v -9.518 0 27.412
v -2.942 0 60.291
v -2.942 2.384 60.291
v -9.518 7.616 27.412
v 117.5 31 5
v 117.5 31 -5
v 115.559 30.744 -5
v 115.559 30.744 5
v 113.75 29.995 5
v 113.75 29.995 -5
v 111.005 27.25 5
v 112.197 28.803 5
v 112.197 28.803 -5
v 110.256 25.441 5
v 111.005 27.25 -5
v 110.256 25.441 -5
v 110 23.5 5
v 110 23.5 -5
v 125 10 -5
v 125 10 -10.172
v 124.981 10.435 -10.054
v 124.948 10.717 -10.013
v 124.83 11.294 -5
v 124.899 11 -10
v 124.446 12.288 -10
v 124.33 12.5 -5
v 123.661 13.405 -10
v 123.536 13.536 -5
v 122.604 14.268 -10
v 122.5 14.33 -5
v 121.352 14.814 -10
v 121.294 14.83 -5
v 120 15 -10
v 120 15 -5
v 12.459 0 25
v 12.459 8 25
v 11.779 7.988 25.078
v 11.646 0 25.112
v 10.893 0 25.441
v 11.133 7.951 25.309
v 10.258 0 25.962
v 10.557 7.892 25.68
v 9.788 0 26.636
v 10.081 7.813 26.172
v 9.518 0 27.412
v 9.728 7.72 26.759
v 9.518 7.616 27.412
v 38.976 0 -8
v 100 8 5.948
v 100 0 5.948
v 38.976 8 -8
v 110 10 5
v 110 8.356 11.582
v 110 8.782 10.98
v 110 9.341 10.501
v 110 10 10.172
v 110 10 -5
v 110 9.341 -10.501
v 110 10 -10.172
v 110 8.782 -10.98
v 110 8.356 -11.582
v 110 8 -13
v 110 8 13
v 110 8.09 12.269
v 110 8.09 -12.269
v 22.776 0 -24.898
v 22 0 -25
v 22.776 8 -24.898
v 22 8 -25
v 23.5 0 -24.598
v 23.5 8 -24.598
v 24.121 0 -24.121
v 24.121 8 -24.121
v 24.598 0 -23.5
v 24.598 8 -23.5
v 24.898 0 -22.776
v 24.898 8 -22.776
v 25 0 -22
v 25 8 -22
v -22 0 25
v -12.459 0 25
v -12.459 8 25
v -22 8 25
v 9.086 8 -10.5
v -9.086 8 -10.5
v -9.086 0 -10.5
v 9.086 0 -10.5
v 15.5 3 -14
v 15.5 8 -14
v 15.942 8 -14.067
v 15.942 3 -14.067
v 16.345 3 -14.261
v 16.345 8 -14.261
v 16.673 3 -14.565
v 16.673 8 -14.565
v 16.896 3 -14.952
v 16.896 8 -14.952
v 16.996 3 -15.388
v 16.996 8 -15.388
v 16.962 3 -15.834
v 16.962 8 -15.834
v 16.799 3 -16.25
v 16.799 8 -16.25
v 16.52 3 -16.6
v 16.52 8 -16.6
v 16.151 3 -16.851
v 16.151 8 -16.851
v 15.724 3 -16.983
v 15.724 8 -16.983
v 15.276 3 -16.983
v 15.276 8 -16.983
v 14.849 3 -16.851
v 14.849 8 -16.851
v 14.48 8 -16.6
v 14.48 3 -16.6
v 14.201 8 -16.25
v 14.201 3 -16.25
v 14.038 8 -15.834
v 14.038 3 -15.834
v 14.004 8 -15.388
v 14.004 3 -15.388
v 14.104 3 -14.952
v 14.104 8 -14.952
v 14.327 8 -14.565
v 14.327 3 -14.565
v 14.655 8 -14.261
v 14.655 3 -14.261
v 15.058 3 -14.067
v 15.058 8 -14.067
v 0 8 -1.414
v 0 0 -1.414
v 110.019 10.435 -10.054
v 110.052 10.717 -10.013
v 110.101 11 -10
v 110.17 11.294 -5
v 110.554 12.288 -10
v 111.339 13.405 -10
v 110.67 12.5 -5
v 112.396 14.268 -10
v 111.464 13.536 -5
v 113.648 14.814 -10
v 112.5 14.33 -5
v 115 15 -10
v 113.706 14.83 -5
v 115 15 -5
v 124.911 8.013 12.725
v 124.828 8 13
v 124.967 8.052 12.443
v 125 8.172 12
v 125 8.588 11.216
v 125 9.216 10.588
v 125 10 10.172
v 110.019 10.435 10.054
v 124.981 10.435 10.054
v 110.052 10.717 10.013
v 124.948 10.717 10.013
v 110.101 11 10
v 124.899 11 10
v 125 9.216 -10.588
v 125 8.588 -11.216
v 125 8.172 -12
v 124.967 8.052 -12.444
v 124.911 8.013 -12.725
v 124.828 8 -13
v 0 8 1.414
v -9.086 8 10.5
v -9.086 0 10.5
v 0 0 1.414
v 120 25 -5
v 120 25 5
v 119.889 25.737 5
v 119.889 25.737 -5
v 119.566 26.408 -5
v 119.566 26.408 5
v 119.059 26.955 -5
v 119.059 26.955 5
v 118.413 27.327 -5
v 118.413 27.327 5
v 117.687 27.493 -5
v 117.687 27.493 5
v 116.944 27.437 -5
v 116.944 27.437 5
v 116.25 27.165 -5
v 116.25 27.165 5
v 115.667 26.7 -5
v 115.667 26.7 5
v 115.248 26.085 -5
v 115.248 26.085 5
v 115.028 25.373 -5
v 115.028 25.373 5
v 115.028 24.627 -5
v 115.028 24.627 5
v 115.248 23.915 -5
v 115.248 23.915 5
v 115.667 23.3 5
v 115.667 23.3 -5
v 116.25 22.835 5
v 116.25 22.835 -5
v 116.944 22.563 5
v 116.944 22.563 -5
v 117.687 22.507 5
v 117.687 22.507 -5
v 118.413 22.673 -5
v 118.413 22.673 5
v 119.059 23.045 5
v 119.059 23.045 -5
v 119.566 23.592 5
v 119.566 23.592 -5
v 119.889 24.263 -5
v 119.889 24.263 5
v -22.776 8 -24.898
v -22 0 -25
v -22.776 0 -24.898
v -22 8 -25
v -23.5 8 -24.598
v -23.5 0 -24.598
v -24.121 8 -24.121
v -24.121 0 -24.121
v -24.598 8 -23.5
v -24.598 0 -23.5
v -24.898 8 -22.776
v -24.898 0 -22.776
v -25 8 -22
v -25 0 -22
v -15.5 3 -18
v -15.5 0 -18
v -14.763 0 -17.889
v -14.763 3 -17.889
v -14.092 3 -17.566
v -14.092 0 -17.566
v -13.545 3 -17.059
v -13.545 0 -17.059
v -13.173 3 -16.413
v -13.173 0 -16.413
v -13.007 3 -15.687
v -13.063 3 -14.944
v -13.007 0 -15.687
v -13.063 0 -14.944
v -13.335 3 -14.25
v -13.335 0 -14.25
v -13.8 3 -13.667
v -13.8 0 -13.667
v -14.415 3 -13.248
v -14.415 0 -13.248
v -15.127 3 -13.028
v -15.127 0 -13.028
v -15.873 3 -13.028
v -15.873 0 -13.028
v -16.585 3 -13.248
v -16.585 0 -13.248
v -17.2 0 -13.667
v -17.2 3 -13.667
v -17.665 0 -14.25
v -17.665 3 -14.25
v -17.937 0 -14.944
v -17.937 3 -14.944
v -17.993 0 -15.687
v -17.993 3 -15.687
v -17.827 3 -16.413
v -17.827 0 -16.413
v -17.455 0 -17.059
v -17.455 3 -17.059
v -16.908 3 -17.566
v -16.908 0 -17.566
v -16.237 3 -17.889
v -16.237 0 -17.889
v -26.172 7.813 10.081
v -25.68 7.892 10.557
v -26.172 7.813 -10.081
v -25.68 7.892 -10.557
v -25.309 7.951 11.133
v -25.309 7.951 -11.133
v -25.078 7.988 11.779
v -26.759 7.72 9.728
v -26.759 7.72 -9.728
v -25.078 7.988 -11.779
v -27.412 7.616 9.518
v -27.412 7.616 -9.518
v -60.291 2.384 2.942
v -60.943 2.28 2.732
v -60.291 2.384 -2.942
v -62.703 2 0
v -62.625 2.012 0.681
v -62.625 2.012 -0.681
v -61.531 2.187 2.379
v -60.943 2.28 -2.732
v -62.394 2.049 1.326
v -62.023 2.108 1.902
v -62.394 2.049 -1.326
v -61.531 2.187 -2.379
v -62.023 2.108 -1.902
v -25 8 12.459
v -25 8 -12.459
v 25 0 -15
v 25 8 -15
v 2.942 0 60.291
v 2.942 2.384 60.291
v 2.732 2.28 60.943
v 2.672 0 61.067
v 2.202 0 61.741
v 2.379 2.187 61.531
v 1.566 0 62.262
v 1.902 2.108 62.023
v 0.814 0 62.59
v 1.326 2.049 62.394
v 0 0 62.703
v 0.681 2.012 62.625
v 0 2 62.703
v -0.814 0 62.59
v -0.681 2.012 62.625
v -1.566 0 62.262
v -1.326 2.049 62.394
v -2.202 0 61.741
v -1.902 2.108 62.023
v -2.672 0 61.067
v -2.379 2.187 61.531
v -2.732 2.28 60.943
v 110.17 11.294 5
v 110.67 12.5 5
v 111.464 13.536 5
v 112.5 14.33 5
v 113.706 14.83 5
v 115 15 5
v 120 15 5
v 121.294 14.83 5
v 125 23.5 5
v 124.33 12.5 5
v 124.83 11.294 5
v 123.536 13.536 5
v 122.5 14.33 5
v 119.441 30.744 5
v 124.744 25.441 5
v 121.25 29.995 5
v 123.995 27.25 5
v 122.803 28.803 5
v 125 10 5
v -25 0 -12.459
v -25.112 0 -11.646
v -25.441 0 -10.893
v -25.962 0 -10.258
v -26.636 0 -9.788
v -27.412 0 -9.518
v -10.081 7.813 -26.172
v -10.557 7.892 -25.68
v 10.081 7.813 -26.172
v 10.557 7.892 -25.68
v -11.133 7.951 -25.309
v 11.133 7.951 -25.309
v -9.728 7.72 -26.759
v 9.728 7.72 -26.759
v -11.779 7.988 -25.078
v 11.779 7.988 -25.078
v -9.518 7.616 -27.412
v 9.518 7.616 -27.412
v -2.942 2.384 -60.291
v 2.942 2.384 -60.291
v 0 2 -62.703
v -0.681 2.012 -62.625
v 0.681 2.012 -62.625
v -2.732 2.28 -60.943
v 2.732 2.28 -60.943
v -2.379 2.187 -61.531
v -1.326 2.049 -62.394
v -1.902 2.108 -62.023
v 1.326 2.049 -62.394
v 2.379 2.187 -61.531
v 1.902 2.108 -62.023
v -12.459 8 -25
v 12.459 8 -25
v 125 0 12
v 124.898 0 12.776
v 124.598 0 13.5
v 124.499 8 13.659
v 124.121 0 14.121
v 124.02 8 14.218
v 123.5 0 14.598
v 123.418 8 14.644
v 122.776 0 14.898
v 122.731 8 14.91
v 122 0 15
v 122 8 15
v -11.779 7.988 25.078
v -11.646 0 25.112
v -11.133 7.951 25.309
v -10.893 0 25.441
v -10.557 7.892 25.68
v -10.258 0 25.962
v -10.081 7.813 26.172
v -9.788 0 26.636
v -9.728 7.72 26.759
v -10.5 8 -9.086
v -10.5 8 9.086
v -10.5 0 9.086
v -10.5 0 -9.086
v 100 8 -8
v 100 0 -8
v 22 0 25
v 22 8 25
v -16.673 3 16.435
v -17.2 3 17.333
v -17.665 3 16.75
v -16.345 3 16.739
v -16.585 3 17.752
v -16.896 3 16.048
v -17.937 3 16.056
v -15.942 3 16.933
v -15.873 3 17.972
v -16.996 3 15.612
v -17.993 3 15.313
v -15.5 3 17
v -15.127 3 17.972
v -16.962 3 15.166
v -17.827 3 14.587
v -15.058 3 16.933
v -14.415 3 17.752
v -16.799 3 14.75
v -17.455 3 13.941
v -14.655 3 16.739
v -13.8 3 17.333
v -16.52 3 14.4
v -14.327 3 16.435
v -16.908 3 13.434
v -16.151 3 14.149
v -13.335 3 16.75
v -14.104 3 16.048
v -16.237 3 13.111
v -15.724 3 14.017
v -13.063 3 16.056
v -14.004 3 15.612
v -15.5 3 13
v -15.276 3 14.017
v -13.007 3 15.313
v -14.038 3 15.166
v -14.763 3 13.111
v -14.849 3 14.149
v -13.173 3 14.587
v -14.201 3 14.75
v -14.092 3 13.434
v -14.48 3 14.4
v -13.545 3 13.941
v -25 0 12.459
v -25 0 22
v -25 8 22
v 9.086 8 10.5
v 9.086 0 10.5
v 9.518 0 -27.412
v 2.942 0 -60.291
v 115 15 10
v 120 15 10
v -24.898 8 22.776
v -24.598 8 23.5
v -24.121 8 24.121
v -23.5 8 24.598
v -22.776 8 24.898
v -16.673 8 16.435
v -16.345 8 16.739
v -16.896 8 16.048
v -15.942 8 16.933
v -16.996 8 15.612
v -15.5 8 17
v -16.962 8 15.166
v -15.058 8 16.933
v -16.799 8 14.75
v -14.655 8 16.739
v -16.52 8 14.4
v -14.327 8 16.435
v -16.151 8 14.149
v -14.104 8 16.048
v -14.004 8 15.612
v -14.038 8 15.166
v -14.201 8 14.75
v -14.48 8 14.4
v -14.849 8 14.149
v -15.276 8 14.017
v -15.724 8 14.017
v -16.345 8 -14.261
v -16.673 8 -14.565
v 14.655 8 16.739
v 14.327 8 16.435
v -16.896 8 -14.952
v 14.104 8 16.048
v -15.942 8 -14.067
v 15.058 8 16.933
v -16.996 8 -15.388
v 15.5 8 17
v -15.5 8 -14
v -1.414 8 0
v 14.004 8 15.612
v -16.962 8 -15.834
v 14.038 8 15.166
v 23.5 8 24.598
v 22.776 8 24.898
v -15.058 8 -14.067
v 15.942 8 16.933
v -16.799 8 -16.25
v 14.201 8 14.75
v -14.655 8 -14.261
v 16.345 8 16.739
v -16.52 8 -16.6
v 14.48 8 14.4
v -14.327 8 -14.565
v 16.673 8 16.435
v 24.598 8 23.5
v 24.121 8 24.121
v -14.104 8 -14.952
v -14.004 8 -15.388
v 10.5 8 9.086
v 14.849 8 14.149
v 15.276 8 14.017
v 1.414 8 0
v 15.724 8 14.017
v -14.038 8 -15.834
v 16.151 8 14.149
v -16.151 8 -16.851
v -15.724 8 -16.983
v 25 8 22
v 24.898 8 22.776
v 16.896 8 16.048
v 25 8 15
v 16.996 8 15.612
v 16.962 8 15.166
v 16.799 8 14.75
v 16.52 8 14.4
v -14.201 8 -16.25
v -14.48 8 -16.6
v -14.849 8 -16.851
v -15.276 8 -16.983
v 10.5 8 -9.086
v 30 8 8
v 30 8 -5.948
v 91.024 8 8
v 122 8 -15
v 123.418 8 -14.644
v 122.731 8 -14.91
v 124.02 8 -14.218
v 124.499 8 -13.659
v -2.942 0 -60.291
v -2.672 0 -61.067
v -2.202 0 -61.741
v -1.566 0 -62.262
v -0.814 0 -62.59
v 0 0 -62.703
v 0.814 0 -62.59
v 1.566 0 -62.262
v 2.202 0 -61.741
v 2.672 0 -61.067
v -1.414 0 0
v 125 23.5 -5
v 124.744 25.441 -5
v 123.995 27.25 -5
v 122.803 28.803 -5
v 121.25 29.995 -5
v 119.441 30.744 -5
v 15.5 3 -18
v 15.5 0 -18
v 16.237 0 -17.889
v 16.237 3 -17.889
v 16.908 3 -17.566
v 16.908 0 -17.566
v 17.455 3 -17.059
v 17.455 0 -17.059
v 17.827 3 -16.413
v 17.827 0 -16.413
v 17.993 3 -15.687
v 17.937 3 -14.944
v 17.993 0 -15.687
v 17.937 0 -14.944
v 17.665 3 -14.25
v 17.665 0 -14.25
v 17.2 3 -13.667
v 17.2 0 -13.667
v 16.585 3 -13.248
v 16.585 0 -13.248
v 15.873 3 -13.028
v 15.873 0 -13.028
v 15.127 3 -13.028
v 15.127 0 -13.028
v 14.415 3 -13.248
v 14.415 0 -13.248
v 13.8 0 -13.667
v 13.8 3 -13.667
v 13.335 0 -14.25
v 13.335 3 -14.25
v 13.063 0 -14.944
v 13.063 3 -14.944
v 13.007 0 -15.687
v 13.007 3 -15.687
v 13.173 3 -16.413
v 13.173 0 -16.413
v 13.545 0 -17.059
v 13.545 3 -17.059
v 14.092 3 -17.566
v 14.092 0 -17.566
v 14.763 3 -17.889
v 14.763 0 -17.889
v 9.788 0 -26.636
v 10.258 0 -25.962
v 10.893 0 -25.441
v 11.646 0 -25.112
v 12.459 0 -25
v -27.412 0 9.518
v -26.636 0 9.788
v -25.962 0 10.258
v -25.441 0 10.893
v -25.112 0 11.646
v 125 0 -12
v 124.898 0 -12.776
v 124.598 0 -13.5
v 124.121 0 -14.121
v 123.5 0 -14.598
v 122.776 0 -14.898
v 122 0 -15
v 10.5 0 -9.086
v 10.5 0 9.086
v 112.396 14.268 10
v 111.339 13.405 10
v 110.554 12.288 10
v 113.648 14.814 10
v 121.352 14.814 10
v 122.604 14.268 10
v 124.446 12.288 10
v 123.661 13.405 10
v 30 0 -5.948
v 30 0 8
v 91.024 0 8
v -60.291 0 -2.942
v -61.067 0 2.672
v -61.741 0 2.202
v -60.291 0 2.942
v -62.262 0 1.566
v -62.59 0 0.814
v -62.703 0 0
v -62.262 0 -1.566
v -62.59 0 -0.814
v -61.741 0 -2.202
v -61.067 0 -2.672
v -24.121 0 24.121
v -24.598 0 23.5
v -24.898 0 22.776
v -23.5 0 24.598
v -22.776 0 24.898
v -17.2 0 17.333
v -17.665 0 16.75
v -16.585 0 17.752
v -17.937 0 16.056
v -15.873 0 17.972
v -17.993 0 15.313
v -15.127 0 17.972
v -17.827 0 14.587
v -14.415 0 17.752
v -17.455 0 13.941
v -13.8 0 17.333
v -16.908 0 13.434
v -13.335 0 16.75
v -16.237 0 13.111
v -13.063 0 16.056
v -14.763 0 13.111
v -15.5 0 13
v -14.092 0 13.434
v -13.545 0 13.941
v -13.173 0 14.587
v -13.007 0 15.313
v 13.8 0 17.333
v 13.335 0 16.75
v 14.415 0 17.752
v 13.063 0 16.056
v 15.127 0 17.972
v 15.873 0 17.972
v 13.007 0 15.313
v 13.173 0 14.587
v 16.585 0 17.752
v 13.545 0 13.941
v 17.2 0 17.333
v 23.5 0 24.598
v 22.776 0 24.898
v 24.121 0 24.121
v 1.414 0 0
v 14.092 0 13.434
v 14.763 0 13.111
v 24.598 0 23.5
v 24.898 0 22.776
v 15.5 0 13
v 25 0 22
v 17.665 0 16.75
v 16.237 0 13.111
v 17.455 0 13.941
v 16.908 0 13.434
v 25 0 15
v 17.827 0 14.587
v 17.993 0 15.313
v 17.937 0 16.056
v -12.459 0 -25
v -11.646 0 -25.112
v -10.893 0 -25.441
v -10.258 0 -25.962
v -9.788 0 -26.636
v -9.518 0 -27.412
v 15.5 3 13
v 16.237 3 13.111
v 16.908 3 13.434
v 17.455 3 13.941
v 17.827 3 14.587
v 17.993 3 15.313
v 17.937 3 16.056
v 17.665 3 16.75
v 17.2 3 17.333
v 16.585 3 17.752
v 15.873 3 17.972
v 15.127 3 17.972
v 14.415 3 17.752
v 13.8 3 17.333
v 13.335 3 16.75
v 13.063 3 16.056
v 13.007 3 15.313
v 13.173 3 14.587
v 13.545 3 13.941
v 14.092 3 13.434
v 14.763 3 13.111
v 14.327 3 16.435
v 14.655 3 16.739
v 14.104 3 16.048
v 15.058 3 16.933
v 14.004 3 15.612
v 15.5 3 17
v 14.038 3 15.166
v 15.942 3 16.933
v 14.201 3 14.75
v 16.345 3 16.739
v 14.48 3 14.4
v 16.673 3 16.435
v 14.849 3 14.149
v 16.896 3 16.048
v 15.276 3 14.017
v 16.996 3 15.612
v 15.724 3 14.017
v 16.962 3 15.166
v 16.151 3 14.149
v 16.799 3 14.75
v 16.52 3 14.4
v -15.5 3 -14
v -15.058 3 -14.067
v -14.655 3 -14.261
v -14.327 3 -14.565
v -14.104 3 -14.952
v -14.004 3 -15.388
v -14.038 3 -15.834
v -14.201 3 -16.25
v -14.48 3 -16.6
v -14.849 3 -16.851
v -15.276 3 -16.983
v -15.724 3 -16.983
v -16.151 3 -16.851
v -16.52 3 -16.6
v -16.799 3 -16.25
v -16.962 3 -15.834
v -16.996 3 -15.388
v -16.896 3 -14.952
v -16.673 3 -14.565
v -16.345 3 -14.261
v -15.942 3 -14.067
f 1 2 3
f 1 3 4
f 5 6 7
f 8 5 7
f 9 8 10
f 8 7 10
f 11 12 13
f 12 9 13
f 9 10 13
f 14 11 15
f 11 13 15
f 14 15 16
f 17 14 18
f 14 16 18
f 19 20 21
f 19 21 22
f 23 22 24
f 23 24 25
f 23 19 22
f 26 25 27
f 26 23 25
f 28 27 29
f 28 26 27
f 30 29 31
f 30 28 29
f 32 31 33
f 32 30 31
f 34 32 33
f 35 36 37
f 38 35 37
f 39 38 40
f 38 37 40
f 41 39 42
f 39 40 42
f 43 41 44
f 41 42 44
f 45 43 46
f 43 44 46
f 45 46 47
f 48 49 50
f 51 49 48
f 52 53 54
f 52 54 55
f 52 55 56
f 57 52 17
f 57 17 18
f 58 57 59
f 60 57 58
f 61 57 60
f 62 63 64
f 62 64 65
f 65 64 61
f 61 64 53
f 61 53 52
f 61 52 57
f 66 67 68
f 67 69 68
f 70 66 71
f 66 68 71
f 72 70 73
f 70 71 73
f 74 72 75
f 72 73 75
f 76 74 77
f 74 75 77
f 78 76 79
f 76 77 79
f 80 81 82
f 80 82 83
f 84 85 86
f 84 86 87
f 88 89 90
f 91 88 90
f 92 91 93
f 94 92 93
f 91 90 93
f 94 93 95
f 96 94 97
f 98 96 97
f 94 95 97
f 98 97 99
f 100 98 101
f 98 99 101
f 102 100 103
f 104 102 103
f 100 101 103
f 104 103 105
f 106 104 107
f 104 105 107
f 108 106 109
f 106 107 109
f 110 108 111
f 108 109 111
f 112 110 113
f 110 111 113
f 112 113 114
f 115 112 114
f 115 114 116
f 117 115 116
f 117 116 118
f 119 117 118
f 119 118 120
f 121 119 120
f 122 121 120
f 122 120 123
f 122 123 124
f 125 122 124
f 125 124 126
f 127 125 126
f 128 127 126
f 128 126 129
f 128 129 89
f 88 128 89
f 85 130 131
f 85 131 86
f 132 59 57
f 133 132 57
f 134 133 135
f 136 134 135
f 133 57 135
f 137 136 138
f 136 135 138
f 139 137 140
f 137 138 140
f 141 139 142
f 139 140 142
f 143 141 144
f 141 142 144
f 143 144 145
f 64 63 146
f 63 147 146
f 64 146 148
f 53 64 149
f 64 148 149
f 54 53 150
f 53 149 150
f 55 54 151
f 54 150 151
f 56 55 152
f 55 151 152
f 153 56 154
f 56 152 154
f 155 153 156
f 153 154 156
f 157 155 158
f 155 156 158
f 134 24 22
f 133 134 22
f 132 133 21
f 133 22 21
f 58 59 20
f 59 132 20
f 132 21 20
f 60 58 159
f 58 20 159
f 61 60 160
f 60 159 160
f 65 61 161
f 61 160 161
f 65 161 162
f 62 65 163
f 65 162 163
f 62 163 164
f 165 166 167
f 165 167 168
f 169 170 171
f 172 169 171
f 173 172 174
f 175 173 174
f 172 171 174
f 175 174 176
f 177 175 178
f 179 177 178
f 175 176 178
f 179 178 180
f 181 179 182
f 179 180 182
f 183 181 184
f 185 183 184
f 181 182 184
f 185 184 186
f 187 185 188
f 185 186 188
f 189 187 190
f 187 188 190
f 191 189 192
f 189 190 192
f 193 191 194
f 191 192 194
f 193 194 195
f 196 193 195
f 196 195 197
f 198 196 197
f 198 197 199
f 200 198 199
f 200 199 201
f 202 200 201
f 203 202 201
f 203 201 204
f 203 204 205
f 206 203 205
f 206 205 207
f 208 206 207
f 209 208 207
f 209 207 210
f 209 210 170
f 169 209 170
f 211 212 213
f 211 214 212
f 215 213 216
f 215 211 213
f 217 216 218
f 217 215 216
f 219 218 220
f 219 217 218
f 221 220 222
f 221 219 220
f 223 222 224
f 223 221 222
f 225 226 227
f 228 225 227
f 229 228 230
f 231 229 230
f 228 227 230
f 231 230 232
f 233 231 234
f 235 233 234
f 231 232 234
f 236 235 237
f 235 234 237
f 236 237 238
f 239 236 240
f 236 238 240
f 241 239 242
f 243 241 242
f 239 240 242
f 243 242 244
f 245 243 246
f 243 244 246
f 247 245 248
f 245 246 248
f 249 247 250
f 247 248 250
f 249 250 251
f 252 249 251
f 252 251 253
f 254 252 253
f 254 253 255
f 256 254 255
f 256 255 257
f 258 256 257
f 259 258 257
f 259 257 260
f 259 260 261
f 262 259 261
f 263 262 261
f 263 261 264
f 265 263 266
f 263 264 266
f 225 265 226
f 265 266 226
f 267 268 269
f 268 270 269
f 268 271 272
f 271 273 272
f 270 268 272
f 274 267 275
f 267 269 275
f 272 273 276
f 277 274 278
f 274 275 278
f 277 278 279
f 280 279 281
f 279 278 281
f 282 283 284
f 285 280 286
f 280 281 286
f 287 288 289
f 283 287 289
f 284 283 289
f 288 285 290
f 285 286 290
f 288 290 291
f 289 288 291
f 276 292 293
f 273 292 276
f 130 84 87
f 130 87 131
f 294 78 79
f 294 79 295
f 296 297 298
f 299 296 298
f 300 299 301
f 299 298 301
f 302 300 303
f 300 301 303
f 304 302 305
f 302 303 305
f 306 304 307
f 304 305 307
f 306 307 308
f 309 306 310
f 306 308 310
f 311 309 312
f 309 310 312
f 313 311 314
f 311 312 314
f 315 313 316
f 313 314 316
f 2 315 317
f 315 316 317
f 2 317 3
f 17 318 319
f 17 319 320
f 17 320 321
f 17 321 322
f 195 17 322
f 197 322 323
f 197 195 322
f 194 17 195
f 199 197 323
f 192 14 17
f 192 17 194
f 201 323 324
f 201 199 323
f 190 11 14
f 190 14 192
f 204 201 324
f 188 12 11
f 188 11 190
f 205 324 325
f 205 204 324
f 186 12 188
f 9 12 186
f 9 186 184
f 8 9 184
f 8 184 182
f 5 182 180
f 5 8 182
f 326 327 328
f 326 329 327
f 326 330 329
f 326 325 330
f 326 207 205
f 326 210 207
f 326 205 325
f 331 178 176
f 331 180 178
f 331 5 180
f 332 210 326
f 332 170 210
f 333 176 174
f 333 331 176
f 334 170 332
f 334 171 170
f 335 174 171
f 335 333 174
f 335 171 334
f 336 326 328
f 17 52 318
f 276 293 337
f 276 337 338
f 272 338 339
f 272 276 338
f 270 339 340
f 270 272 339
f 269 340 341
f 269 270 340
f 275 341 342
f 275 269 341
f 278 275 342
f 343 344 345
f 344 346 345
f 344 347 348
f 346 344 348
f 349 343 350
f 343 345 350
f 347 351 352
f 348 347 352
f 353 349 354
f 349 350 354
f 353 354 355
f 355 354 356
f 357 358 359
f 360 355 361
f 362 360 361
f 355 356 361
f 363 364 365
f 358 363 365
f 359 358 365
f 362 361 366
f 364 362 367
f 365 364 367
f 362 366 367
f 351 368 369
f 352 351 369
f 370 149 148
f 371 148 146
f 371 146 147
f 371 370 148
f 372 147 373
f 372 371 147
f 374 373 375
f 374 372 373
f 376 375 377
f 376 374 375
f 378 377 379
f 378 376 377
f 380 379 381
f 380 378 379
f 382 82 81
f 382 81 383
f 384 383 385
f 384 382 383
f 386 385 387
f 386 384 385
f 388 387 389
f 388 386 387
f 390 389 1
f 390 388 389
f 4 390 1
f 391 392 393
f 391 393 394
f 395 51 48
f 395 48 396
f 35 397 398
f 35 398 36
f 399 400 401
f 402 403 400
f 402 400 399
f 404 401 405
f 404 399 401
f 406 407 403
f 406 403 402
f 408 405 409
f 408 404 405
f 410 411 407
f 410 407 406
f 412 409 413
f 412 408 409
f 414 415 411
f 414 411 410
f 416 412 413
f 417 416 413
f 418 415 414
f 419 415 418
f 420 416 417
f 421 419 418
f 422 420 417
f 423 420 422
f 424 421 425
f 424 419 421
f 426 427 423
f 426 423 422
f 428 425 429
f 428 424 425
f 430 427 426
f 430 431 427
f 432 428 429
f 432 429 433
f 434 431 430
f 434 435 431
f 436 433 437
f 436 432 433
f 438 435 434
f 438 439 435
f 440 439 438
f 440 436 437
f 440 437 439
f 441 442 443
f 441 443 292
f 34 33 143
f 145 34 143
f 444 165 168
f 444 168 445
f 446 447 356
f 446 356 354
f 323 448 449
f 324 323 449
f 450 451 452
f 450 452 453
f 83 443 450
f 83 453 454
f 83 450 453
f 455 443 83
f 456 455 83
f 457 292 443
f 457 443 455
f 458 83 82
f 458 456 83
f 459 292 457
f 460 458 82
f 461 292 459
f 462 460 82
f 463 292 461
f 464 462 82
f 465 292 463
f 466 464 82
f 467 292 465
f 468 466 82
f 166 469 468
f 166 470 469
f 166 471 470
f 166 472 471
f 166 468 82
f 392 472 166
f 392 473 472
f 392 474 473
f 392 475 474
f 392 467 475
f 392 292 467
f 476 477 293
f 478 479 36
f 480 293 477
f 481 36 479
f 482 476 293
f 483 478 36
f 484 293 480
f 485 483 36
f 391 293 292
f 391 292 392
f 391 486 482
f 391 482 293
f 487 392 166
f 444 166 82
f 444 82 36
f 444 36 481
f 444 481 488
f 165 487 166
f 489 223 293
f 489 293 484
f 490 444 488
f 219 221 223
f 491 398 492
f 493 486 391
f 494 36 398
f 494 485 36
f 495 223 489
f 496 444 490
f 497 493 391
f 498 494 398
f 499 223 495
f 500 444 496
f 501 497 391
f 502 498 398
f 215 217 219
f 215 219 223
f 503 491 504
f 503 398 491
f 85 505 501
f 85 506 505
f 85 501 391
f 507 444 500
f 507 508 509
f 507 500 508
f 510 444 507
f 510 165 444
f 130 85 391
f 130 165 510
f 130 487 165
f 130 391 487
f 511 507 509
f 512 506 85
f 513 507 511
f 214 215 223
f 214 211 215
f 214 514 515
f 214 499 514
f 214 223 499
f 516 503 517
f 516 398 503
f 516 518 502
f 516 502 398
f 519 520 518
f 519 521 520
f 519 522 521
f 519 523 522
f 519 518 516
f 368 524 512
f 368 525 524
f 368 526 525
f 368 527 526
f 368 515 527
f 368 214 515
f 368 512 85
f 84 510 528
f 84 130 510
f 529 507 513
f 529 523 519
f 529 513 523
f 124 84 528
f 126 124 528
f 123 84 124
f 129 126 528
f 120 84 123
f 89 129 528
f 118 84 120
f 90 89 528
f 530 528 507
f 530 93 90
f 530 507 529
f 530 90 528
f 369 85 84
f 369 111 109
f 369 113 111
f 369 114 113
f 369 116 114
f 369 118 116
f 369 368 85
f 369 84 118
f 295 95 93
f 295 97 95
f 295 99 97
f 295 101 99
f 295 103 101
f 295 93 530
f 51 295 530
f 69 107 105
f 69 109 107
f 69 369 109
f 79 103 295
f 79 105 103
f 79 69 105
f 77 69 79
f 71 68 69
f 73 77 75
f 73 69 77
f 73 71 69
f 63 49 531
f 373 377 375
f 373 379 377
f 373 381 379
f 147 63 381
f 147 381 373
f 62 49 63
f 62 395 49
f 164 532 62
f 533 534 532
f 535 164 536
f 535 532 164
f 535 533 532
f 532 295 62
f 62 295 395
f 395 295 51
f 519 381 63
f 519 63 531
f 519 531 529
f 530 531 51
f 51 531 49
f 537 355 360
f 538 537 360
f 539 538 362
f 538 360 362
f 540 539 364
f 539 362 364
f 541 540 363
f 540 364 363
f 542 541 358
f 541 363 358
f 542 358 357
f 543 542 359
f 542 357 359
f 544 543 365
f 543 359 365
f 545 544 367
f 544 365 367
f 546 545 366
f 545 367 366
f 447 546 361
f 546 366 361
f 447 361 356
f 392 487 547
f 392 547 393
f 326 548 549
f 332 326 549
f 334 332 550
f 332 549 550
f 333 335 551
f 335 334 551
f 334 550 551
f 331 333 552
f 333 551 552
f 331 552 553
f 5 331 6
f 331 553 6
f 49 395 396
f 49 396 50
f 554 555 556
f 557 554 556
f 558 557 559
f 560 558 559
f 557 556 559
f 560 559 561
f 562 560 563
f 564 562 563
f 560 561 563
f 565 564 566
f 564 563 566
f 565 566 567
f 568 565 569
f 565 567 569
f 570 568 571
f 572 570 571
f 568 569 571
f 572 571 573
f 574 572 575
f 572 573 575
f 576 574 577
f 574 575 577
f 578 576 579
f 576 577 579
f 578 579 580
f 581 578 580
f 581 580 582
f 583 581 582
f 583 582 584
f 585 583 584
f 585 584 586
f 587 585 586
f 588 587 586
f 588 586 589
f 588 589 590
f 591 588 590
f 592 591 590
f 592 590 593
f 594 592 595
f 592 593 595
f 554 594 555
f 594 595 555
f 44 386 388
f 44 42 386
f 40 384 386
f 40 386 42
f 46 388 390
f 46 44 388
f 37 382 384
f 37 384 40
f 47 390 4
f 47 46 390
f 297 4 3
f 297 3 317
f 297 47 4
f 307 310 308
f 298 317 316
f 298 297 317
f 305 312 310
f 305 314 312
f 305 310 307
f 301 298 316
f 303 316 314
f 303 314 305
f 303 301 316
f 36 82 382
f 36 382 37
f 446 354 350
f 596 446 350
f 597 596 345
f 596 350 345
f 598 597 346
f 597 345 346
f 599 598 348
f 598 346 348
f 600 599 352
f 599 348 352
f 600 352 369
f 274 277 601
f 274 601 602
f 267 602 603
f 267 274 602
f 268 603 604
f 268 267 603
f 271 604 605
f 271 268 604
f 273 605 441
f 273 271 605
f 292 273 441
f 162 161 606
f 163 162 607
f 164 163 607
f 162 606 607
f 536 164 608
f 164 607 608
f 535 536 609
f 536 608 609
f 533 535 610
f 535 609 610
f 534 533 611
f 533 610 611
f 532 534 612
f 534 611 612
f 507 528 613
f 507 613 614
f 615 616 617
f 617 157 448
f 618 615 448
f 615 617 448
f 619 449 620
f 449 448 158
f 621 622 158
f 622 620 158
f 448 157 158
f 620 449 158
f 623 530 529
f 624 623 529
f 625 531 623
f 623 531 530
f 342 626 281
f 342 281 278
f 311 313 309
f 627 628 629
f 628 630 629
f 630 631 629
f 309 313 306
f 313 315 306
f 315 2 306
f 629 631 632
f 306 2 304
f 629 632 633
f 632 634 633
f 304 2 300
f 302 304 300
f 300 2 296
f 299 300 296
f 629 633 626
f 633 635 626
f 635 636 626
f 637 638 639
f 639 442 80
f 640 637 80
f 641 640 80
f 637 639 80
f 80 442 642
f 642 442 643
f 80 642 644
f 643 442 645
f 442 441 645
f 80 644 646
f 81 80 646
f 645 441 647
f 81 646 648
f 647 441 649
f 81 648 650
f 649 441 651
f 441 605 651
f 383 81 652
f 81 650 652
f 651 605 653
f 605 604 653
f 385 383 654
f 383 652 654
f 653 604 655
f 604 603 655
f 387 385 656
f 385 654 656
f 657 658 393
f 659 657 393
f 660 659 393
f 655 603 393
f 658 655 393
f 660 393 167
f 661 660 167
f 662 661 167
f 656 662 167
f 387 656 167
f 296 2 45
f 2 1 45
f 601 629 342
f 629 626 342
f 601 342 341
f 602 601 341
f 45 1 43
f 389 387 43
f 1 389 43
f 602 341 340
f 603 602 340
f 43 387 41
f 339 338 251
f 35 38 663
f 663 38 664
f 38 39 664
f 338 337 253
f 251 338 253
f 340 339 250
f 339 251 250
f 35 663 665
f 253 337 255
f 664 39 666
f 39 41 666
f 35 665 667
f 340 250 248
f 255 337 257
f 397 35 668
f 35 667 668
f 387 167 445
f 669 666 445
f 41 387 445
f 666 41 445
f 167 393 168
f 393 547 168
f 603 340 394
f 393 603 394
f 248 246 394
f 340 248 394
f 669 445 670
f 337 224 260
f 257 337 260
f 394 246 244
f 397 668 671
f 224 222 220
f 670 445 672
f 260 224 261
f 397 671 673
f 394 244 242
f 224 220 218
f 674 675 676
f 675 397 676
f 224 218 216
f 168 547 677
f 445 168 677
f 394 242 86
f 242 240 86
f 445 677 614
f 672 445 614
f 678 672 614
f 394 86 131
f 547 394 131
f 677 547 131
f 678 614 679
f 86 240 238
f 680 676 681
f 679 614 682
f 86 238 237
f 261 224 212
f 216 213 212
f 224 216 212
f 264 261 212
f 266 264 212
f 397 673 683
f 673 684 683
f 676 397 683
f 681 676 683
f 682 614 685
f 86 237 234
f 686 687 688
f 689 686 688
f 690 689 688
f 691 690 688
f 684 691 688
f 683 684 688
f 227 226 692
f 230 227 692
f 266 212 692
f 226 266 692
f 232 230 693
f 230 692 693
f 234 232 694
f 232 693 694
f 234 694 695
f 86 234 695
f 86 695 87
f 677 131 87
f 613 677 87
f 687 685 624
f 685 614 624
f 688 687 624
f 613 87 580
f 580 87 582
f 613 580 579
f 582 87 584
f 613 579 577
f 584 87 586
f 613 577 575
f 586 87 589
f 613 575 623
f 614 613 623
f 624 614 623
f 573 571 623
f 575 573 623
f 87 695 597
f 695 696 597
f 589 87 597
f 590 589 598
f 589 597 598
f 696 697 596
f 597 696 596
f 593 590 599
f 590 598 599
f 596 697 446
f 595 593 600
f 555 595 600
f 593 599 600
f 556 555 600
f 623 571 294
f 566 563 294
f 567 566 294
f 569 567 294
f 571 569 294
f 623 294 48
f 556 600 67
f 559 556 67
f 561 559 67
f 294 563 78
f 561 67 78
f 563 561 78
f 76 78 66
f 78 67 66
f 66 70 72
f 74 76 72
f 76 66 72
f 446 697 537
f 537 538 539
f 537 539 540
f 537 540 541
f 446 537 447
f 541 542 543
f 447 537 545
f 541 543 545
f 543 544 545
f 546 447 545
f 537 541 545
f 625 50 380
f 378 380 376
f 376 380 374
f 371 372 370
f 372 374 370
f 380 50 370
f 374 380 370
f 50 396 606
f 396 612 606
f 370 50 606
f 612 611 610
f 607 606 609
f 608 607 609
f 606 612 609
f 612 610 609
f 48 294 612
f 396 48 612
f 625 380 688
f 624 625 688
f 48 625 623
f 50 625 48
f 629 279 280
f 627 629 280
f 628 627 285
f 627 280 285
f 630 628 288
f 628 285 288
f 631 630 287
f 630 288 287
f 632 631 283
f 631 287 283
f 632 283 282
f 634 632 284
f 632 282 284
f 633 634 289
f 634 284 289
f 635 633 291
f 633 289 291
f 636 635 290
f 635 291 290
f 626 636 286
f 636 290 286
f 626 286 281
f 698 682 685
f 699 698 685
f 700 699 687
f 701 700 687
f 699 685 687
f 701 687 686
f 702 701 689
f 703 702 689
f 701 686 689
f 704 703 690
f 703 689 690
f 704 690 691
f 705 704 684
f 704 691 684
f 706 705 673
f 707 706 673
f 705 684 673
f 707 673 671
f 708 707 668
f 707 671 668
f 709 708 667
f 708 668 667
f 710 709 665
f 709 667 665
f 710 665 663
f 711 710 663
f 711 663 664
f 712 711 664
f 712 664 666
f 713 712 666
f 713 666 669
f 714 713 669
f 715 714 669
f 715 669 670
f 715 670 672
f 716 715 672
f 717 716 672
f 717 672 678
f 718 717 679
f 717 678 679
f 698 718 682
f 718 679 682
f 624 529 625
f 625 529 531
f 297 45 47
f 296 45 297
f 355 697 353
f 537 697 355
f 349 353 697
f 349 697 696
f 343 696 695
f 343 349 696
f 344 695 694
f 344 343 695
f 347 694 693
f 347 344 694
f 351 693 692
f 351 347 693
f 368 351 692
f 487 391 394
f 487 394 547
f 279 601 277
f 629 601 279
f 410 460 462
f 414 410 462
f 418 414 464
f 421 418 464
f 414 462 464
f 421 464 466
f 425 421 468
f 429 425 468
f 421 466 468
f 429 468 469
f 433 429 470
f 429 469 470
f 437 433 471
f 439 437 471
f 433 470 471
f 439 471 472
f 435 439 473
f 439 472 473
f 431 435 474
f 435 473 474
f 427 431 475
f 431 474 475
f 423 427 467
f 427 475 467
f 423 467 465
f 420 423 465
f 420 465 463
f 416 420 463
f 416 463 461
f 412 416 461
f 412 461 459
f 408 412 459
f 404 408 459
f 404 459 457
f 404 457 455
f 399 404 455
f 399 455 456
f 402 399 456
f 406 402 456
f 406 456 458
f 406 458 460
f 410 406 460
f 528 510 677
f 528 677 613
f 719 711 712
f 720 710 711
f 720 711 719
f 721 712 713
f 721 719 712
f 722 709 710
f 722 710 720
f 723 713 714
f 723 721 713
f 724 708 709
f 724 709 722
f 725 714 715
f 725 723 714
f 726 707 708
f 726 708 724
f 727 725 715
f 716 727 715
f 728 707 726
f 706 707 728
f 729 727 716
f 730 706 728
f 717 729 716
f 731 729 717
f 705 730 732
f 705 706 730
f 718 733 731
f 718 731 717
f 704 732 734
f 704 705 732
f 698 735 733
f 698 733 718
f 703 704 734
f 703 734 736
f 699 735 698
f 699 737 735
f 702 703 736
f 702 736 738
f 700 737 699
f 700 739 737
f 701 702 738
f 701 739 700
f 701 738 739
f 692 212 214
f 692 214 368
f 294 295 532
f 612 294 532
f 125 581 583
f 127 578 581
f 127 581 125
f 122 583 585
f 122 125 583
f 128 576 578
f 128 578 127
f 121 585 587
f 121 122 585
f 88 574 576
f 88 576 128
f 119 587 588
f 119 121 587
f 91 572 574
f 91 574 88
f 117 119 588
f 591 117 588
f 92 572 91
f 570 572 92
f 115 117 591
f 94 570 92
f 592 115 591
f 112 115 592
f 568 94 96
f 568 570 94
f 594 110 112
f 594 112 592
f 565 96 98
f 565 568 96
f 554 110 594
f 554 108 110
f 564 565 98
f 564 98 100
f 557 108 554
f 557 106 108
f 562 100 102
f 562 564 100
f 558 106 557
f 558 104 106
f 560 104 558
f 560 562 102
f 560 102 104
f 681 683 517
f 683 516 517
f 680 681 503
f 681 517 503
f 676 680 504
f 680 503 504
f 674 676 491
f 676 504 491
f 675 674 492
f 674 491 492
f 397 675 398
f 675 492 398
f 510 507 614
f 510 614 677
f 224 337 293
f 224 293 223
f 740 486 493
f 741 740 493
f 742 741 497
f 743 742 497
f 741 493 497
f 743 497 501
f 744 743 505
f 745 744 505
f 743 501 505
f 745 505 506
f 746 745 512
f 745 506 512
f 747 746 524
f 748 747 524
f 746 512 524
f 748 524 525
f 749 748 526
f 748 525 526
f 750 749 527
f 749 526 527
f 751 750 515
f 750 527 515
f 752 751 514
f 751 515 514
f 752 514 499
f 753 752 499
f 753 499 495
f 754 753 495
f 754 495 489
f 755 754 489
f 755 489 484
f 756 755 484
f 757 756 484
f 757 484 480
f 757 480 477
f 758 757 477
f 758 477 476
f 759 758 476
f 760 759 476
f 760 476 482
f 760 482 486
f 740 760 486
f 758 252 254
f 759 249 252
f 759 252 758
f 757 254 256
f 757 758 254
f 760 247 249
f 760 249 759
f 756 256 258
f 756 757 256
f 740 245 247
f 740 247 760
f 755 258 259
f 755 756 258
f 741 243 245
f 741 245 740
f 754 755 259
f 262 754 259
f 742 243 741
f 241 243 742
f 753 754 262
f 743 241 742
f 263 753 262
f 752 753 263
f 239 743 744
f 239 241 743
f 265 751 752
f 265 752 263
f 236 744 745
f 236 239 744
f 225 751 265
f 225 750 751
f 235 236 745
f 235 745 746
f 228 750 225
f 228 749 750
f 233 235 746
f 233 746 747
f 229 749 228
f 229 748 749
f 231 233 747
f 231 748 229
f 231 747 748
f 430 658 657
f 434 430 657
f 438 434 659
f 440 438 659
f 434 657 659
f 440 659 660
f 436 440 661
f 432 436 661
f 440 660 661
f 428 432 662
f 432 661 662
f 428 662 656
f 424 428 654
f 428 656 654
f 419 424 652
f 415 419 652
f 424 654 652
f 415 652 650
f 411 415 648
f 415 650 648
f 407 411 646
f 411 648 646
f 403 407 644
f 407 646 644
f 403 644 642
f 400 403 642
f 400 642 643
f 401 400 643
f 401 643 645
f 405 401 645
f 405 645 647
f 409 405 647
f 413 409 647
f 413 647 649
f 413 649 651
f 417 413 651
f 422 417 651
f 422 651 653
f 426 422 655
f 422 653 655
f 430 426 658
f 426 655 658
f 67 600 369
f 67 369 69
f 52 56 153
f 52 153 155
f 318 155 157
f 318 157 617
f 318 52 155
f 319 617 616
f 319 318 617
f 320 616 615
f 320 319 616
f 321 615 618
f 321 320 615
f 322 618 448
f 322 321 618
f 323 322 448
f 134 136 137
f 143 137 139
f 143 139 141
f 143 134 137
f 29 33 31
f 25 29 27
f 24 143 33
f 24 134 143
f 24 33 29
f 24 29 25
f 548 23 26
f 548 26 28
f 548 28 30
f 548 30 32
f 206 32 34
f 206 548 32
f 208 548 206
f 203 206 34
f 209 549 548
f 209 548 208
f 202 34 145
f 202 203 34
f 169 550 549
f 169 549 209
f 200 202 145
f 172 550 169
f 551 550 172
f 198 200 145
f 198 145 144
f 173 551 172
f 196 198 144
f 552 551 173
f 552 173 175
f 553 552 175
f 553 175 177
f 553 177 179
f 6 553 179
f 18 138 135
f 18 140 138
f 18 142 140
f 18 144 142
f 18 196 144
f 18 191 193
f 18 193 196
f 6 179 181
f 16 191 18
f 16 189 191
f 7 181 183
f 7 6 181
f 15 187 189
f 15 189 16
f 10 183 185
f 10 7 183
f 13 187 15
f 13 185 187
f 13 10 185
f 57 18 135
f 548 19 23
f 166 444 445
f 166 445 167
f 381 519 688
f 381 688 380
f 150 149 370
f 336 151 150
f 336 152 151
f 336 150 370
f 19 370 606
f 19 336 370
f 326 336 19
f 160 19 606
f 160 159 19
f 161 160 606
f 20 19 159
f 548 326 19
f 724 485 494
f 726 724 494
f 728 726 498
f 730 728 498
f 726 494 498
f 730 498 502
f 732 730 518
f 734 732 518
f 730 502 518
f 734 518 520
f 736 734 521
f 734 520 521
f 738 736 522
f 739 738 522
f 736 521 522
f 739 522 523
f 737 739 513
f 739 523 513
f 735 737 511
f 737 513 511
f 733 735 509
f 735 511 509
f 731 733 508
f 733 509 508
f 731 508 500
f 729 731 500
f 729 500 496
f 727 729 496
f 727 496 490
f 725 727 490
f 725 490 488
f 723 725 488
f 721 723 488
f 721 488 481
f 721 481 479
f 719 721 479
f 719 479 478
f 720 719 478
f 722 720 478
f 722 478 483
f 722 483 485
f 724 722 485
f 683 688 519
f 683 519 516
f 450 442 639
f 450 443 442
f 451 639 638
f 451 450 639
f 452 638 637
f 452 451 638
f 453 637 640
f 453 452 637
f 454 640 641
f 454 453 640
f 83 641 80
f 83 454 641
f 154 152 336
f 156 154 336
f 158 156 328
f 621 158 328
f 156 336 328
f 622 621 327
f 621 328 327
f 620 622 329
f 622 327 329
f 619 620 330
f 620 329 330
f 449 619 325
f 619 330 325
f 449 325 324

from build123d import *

# Parameters (mm, degrees)
BOSS_EXTRUDE1_DEPTH     = 8
FILLET1_R               = 3
CUT_EXTRUDE1_DEPTH      = 90.03548582
CUT_EXTRUDE2_DEPTH      = 90.03548582
CUT_EXTRUDE2_DEPTH_BACK = 90.03548582
FILLET2_R               = 3
SKETCH4_R               = 1.5
CUT_EXTRUDE3_DEPTH      = 90.03548582
SKETCH5_R               = 2.5
CUT_EXTRUDE4_DEPTH      = 3
SKETCH7_W               = 100
SKETCH7_H               = 30
BOSS_EXTRUDE2_DEPTH     = 8
SKETCH8_W               = 15
SKETCH8_H               = 20
BOSS_EXTRUDE3_DEPTH     = 23
SKETCH9_R               = 2.5
CUT_EXTRUDE5_DEPTH      = 20
FILLET3_R               = 7.5
FILLET4_R               = 3
FILLET5_R               = 3
CUT_EXTRUDE6_DEPTH      = 142.723882577
CUT_EXTRUDE7_DEPTH      = 5
SKETCH12_W              = 15
SKETCH12_H              = 6
CUT_EXTRUDE8_DEPTH      = 5
SKETCH13_W              = 15
SKETCH13_H              = 6
CUT_EXTRUDE9_DEPTH      = 5
FILLET6_R               = 5


with BuildPart() as part:
    # Sketch1 → Boss-Extrude1 (new body)
    with BuildSketch(Plane(origin=(0, 0, 0), x_dir=(1, 0, 0), z_dir=(0, 1, 0))):
        Polygon((-10, 25), (0, 75), (10, 25), (25, 25), (25, 10), (75, 0), (25, -10), (25, -25), (10, -25), (0, -75), (-10, -25), (-25, -25), (-25, -10), (-75, 0), (-25, 10), (-25, 25), align=None)
    extrude(amount=BOSS_EXTRUDE1_DEPTH)

    # Fillet1
    fillet1_edges = [part.edges().sort_by_distance(p)[0] for p in [
        (0, 4, -75),
        (75, 4, 0),
        (0, 4, 75),
        (-75, 4, 0),
    ]]
    fillet(fillet1_edges, radius=FILLET1_R)

    # Sketch2 → Cut-Extrude1 (cut, symmetric)
    with BuildSketch(Plane(origin=(0, 0, 0), x_dir=(0, 0, -1), z_dir=(1, 0, 0))):
        Polygon((25, 8), (62.702941459, 2), (62.702941459, 8), align=None)
    cut_extrude1 = extrude(amount=CUT_EXTRUDE1_DEPTH, both=True, mode=Mode.SUBTRACT)

    # Mirror2: Cut-Extrude1 across plane
    add(cut_extrude1.mirror(Plane.XY), mode=Mode.SUBTRACT)

    # Sketch3 → Cut-Extrude2 (cut, two sides: drawn at the far end of the back side and taken through both)
    with BuildSketch(Plane.XY.offset(-CUT_EXTRUDE2_DEPTH_BACK)):
        Polygon((-25, 8), (-62.702941459, 2), (-62.702941459, 8), align=None)
    extrude(amount=CUT_EXTRUDE2_DEPTH + CUT_EXTRUDE2_DEPTH_BACK, mode=Mode.SUBTRACT)

    # Fillet2
    fillet2_edges = [part.edges().sort_by_distance(p)[0] for p in [
        (-10, 4, -25),
        (10, 4, -25),
        (25, 4, -25),
        (25, 4, 25),
        (10, 4, 25),
        (-10, 4, 25),
        (-25, 4, 25),
        (-25, 4, 10),
        (-25, 4, -10),
        (-25, 4, -25),
    ]]
    fillet(fillet2_edges, radius=FILLET2_R)

    # Sketch4 → Cut-Extrude3 (cut, through all)
    with BuildSketch(Plane(origin=(0, 8, 0), x_dir=(1, 0, 0), z_dir=(0, 1, 0))):
        with Locations(Location((-15.5, 15.5, 0), (0, 0, 270))):
            Circle(SKETCH4_R)
        with Locations(Location((15.5, 15.5, 0), (0, 0, 270))):
            Circle(SKETCH4_R)
        with Locations(Location((15.5, -15.5, 0), (0, 0, 270))):
            Circle(SKETCH4_R)
        with Locations(Location((-15.5, -15.5, 0), (0, 0, 270))):
            Circle(SKETCH4_R)
    extrude(amount=-CUT_EXTRUDE3_DEPTH, mode=Mode.SUBTRACT)

    # Sketch5 → Cut-Extrude4 (cut)
    with BuildSketch(Plane.XZ):
        with Locations(Location((15.5, -15.5, 0), (0, 0, 270))):
            Circle(SKETCH5_R)
        with Locations(Location((-15.5, -15.5, 0), (0, 0, 270))):
            Circle(SKETCH5_R)
        with Locations(Location((-15.5, 15.5, 0), (0, 0, 270))):
            Circle(SKETCH5_R)
        with Locations(Location((15.5, 15.5, 0), (0, 0, 270))):
            Circle(SKETCH5_R)
    extrude(amount=-CUT_EXTRUDE4_DEPTH, mode=Mode.SUBTRACT)

    # Sketch7 → Boss-Extrude2 (add)
    with BuildSketch(Plane(origin=(0, 8, 0), x_dir=(1, 0, 0), z_dir=(0, 1, 0))):
        with Locations((75, 0)):
            Rectangle(SKETCH7_W, SKETCH7_H)
    extrude(amount=-BOSS_EXTRUDE2_DEPTH)

    # Sketch8 → Boss-Extrude3 (add)
    with BuildSketch(Plane(origin=(0, 8, 0), x_dir=(1, 0, 0), z_dir=(0, 1, 0))):
        with Locations((117.5, 0)):
            Rectangle(SKETCH8_W, SKETCH8_H)
    extrude(amount=BOSS_EXTRUDE3_DEPTH)

    # Sketch9 → Cut-Extrude5 (cut)
    with BuildSketch(Plane.XY.offset(10)):
        with Locations((117.5, 25)):
            Circle(SKETCH9_R)
    extrude(amount=-CUT_EXTRUDE5_DEPTH, mode=Mode.SUBTRACT)

    # Fillet3
    fillet3_edges = [part.edges().sort_by_distance(p)[0] for p in [
        (110, 31, 0),
        (125, 31, 0),
    ]]
    fillet(fillet3_edges, radius=FILLET3_R - 0.0001)  # a hair under: the kernel refuses the full size

    # Fillet4
    fillet4_edges = [part.edges().sort_by_distance(p)[0] for p in [
        (117.5, 8, -10),
        (117.5, 8, 10),
    ]]
    fillet(fillet4_edges, radius=FILLET4_R)

    # Fillet5
    fillet5_edges = [part.edges().sort_by_distance(p)[0] for p in [
        (125, 4, 15),
        (125, 4, -15),
    ]]
    fillet(fillet5_edges, radius=FILLET5_R)

    # Sketch10 → Cut-Extrude6 (cut, through all)
    with BuildSketch(Plane(origin=(0, 8, 0), x_dir=(1, 0, 0), z_dir=(0, 1, 0))):
        Polygon((30, -8), (91.024338464, -8), (30, 5.94842022), align=None)
        Polygon((38.975661536, 8), (100, 8), (100, -5.94842022), align=None)
        Polygon((9.085786438, 10.5), (0, 1.414213562), (-9.085786438, 10.5), align=None)
        Polygon((10.5, -9.085786438), (1.414213562, 0), (10.5, 9.085786438), align=None)
        Polygon((-9.085786438, -10.5), (0, -1.414213562), (9.085786438, -10.5), align=None)
        Polygon((-10.5, 9.085786438), (-1.414213562, 0), (-10.5, -9.085786438), align=None)
    extrude(amount=-CUT_EXTRUDE6_DEPTH, mode=Mode.SUBTRACT)

    # Sketch11 → Cut-Extrude7 (cut)
    with BuildSketch(Plane.XY.offset(10)):
        with BuildLine():
            Line((109, 25), (109, 32))
            Line((109, 32), (126, 32))
            Line((126, 32), (126, 25))
            ThreePointArc((126, 25), (117.5, 16.5), (109, 25))
        make_face()
    cut_extrude7 = extrude(amount=-CUT_EXTRUDE7_DEPTH, mode=Mode.SUBTRACT)

    # Mirror4: Cut-Extrude7 across plane
    add(cut_extrude7.mirror(Plane.XY), mode=Mode.SUBTRACT)

    # Sketch12 → Cut-Extrude8 (cut)
    with BuildSketch(Plane.XY.offset(10)):
        with Locations((117.5, 18)):
            Rectangle(SKETCH12_W, SKETCH12_H)
    extrude(amount=-CUT_EXTRUDE8_DEPTH, mode=Mode.SUBTRACT)

    # Sketch13 → Cut-Extrude9 (cut)
    with BuildSketch(Plane(origin=(0, 0, -10), x_dir=(-1, 0, 0), z_dir=(0, 0, -1))):
        with Locations((-117.5, 18)):
            Rectangle(SKETCH13_W, SKETCH13_H)
    extrude(amount=-CUT_EXTRUDE9_DEPTH, mode=Mode.SUBTRACT)

    # Fillet6
    fillet6_edges = [part.edges().sort_by_distance(p)[0] for p in [
        (125, 15, -7.5),
        (110, 15, -7.5),
        (110, 15, 7.5),
        (125, 15, 7.5),
    ]]
    fillet(fillet6_edges, radius=FILLET6_R)


solid = part.part
